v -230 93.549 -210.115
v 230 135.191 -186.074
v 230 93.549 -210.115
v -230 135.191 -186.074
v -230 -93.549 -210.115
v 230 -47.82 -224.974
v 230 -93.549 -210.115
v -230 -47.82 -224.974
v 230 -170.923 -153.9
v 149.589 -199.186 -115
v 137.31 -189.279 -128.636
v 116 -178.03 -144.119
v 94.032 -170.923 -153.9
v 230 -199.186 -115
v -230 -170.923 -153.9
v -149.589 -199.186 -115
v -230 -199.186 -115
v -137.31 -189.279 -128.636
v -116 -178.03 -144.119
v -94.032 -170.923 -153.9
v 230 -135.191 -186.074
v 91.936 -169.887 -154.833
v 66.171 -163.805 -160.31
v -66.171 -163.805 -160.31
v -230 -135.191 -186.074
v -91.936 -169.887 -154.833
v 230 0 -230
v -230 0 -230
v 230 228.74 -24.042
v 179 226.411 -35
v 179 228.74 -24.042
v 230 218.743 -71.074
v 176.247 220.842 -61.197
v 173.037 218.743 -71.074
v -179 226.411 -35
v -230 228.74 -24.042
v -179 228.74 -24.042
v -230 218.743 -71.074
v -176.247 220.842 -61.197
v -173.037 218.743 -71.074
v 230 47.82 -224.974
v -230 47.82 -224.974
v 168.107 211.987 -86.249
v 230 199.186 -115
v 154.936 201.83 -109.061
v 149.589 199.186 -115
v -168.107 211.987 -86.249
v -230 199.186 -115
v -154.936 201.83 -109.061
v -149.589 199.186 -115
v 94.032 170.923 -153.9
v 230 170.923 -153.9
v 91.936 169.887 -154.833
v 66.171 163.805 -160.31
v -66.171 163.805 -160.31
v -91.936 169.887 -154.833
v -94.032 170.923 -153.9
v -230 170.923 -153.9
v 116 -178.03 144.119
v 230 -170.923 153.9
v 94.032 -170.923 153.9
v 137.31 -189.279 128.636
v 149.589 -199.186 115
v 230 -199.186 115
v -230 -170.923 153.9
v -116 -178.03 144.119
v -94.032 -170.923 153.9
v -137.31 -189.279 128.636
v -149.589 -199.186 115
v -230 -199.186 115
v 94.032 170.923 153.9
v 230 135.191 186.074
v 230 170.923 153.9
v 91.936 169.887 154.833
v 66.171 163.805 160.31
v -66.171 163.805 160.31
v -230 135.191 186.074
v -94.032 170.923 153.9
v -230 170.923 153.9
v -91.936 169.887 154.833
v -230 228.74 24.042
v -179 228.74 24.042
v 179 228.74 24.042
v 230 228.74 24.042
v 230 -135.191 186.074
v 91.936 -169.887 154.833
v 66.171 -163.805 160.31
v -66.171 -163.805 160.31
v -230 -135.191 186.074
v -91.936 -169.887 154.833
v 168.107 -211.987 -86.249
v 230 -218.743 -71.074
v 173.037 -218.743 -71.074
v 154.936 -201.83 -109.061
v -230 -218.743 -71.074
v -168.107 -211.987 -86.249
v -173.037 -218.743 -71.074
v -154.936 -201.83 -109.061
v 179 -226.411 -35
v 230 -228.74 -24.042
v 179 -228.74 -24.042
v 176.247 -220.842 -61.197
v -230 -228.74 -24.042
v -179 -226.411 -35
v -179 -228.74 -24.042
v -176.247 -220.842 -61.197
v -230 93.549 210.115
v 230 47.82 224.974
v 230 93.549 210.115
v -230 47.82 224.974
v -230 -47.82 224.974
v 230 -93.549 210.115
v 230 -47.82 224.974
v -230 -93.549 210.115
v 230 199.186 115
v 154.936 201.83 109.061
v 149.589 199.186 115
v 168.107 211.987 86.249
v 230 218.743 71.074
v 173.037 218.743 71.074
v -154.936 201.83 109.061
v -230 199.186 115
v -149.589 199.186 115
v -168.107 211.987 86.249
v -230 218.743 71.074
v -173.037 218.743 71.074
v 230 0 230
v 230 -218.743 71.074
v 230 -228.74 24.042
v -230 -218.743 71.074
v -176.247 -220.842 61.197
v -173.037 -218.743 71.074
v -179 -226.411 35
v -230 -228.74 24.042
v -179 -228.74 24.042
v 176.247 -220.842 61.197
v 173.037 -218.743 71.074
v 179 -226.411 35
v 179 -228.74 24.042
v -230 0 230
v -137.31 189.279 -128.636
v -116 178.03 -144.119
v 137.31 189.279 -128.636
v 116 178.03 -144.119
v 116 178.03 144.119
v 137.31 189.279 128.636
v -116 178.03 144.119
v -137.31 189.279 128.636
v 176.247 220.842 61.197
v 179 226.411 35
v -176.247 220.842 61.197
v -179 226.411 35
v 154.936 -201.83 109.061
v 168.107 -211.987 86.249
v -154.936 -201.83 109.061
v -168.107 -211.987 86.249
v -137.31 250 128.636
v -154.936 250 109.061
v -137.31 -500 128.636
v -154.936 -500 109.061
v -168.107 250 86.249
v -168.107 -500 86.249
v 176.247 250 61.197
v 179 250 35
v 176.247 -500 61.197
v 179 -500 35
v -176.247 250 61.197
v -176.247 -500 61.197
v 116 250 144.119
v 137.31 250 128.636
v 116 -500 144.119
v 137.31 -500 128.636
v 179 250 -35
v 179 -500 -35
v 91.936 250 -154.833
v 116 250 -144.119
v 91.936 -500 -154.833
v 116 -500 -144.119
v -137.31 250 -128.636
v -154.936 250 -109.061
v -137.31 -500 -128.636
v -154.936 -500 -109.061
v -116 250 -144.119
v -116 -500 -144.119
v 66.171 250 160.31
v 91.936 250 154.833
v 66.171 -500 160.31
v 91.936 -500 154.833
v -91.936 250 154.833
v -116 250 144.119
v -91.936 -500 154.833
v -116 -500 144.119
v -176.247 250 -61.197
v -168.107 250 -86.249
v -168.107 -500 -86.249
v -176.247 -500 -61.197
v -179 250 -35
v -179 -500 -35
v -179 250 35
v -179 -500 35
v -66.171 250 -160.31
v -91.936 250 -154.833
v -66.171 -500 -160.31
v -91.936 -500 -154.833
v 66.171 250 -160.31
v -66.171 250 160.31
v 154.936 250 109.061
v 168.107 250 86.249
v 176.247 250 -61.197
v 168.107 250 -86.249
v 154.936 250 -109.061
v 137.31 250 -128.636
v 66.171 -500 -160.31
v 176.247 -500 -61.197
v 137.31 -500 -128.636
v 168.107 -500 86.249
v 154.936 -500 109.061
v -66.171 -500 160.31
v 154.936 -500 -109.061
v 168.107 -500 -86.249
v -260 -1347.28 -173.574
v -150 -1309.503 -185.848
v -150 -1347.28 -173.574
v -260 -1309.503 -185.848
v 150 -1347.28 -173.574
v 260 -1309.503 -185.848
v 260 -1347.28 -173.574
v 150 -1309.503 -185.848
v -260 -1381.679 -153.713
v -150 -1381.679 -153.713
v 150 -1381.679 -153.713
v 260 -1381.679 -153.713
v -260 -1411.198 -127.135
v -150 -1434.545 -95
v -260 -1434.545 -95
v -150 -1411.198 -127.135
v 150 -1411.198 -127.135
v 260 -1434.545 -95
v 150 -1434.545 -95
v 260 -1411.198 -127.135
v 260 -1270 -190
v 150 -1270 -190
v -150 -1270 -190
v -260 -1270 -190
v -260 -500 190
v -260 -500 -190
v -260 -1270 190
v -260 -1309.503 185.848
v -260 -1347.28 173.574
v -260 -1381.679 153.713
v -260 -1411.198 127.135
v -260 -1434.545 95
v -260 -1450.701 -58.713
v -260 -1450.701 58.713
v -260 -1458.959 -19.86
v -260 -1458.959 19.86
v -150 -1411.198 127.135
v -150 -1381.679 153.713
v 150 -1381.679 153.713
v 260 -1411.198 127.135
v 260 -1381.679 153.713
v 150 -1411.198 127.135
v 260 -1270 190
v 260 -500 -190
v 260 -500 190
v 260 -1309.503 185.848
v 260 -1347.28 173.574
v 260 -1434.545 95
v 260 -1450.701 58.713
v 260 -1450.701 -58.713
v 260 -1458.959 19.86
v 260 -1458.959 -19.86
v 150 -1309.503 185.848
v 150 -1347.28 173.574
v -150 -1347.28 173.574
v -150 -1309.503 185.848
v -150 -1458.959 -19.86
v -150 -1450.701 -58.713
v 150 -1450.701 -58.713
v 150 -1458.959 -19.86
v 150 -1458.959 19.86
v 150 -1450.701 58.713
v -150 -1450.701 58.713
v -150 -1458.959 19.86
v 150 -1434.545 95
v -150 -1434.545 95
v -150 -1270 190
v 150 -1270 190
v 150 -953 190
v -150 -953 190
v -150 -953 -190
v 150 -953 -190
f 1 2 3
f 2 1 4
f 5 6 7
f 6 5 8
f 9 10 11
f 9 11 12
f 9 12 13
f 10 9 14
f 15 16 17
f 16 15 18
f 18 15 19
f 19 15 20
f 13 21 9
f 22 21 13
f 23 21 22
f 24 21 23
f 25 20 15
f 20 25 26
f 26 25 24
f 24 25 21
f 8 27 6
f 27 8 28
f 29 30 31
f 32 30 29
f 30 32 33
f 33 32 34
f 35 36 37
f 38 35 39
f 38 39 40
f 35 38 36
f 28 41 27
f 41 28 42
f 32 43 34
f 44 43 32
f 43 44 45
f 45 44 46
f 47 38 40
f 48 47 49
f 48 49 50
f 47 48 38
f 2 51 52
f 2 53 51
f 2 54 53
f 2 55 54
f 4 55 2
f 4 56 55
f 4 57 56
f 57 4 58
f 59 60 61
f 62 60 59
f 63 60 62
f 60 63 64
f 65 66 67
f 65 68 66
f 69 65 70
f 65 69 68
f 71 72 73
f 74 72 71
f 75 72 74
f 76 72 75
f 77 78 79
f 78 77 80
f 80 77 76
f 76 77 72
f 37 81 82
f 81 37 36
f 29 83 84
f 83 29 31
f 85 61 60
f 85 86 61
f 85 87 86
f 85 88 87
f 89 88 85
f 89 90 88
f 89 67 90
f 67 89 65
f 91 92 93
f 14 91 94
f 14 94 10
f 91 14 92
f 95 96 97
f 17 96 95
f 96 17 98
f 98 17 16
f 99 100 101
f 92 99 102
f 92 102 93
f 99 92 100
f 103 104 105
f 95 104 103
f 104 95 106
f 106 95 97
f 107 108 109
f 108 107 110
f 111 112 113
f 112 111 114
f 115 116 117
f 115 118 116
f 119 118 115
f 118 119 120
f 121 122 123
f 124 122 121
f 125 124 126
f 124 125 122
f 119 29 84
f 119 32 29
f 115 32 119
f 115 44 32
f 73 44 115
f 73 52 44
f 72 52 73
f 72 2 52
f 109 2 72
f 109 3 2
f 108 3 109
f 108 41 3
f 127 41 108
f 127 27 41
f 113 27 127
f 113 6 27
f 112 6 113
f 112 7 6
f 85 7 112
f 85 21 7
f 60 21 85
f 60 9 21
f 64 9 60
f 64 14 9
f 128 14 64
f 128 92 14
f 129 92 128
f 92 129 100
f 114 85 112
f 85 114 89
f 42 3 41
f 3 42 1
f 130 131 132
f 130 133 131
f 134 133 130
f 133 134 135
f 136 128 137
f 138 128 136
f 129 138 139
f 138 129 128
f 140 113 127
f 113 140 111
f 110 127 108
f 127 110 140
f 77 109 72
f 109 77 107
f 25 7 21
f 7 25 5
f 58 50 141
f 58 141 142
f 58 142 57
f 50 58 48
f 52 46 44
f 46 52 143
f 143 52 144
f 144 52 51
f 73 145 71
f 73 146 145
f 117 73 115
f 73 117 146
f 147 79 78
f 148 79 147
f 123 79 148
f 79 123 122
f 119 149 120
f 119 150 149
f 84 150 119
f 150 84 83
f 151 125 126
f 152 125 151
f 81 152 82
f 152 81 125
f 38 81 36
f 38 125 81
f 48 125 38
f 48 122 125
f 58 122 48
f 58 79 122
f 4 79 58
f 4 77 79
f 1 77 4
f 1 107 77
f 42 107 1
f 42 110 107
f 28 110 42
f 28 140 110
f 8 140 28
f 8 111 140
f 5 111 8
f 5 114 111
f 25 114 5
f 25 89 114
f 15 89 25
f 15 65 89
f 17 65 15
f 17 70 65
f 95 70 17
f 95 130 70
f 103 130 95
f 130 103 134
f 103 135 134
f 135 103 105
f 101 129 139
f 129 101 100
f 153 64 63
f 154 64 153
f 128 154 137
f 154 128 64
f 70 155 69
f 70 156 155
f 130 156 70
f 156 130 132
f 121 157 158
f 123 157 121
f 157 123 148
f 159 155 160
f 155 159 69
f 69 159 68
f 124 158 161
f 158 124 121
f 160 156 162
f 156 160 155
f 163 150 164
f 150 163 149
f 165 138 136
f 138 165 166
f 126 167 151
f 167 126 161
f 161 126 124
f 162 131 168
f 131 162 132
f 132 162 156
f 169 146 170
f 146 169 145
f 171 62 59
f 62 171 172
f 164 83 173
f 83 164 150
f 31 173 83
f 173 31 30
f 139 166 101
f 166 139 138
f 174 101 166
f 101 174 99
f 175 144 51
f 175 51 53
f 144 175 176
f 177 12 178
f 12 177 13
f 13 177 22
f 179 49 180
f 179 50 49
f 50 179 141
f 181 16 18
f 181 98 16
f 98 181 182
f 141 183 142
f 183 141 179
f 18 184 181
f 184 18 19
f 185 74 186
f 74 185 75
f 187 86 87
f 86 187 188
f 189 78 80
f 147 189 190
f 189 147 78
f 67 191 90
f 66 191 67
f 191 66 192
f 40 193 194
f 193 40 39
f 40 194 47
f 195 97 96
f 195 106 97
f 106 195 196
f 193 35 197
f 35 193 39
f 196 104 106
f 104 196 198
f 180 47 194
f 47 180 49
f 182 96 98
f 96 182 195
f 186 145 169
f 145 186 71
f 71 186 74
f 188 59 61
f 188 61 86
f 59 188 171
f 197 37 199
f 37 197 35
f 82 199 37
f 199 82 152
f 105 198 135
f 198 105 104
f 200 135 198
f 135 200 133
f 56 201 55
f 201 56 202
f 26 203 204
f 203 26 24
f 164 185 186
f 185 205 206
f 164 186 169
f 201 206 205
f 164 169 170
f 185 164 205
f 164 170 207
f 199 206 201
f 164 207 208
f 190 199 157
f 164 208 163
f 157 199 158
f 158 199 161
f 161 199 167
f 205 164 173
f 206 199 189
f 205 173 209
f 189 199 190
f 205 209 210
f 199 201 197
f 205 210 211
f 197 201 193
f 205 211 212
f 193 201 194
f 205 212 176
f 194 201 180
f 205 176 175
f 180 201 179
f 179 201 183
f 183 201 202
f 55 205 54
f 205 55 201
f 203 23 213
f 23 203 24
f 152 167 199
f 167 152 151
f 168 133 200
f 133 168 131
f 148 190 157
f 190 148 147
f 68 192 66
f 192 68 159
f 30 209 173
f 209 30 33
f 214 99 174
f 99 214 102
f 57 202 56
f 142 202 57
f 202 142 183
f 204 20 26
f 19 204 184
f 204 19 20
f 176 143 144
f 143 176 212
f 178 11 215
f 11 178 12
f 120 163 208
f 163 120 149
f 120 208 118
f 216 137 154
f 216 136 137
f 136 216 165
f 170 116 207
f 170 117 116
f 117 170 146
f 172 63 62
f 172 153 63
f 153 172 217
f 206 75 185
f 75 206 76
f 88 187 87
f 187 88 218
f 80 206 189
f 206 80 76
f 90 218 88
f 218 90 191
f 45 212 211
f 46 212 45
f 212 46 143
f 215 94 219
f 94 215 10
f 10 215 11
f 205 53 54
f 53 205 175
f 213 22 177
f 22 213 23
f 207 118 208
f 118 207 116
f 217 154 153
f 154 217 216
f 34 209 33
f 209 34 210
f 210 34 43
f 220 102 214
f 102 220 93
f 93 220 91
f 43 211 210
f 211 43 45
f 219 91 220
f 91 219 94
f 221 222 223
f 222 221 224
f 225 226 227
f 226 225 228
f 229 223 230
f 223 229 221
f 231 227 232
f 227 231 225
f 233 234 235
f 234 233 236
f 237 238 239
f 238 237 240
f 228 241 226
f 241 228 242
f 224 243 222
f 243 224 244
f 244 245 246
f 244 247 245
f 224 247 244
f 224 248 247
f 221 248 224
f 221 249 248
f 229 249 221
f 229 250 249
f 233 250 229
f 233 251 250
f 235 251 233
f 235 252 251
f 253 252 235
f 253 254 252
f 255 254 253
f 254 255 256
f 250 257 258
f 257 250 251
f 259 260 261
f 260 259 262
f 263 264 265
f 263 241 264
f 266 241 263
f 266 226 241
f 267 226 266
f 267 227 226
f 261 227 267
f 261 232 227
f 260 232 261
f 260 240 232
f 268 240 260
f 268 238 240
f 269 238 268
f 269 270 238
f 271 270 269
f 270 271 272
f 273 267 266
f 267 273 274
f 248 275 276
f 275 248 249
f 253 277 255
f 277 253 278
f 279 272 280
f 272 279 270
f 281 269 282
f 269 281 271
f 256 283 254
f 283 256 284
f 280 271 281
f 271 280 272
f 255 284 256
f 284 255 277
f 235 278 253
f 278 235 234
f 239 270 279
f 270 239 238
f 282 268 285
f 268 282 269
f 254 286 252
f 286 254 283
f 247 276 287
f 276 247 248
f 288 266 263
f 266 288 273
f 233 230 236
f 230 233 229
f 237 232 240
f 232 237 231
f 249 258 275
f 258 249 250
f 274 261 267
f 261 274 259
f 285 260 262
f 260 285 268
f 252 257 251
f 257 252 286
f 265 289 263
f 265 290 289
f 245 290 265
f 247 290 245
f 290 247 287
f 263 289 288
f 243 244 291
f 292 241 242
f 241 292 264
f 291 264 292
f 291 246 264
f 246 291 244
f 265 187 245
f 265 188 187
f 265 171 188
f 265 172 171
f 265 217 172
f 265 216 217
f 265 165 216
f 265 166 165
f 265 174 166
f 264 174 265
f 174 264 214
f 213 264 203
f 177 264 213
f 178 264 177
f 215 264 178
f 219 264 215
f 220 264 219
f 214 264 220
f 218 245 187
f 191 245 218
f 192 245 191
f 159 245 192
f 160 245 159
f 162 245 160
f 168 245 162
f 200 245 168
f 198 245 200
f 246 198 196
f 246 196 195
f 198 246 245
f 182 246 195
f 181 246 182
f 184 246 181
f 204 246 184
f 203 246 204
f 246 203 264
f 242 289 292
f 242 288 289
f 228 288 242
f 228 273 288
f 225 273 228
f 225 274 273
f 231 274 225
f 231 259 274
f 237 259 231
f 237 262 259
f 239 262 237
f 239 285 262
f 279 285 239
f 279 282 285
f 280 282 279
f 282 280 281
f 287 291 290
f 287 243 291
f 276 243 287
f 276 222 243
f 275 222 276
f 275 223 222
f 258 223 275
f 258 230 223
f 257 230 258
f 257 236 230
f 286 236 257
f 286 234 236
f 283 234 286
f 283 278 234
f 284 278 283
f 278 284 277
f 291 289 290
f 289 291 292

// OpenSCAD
// Brazo Inferior del robot

difference()
{
	union()
	{
		rotate([0,90,0])cylinder(h=460 ,r1=230, r2=230, center=true);

		translate([0,250,0])rotate([90,0,0])linear_extrude(height = 775, center = false, convexity = 10, scale=1)
			hull() 
			{
				translate([-53,-35,0])circle(r=126);
				translate([-53,35,0])circle(r=126);
				translate([53,-35,0])circle(r=126);
				translate([53,35,0])circle(r=126);
			}
		translate([0,-1270,0])rotate([0,90,0])cylinder(h=520 ,r1=190, r2=190, center=true);
		translate([-260,-1270,-190]) cube(size = [520,770,380], center = false);
	}		
	translate([-0,-1218,-0]) cube(size = [300,530,420], center = true);
}
